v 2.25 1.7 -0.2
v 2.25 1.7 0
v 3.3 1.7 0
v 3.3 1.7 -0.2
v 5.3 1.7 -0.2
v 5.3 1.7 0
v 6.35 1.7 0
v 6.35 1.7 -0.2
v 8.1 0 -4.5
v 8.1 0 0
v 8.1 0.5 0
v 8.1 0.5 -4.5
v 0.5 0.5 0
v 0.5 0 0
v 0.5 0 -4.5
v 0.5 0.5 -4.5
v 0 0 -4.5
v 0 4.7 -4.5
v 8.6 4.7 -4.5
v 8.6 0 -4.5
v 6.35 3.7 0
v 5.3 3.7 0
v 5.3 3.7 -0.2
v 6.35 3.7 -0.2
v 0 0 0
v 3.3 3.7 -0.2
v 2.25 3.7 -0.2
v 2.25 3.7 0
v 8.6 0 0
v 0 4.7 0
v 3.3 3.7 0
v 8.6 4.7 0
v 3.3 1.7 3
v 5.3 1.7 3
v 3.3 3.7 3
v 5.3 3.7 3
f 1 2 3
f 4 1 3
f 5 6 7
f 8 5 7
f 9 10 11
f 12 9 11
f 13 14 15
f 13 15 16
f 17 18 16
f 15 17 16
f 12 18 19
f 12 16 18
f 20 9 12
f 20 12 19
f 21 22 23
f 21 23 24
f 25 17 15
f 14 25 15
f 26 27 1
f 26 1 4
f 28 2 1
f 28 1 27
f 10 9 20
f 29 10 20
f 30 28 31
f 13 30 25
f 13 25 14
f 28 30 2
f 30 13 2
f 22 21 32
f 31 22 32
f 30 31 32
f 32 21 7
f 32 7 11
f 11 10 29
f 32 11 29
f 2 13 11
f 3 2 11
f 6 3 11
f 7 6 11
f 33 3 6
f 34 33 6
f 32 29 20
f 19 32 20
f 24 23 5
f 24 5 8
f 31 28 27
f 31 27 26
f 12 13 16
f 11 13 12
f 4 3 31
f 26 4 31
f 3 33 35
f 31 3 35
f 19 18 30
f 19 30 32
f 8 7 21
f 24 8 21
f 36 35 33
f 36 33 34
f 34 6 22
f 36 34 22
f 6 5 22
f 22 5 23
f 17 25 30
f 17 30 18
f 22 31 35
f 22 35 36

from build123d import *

# Parameters (mm, degrees)
SKETCH_1_W           = 8.6
SKETCH_1_H           = 4.5
EXTRUDE_1_DEPTH      = 4.7
SKETCH_2_W           = 4.1
SKETCH_2_H           = 2
CUT_EXTRUDE_1_DEPTH  = 0.2
CUT_EXTRUDE_2_REACH  = 6.5
SKETCH_4_W           = 7.6
SKETCH_4_H           = 0.5
SKETCH_5_W           = 2
SKETCH_5_H           = 2
EXTRUDE_2_DEPTH      = 3
EXTRUDE_2_DEPTH_BACK = 0.2


with BuildPart() as part:
    # 草图1 → 凸台-拉伸1 (new body)
    with BuildSketch(Plane(origin=(0, 0, 0), x_dir=(1, 0, 0), z_dir=(0, 1, 0))):
        with Locations((4.3, 2.25)):
            Rectangle(SKETCH_1_W, SKETCH_1_H)
    extrude(amount=EXTRUDE_1_DEPTH)

    # 草图2 → 切除-拉伸1 (cut)
    with BuildSketch(Plane.XY):
        with Locations((4.3, 2.7)):
            Rectangle(SKETCH_2_W, SKETCH_2_H)
    extrude(amount=-CUT_EXTRUDE_1_DEPTH, mode=Mode.SUBTRACT)

    # 草图4 → 切除-拉伸2 (cut, up to next)
    with BuildSketch(Plane.XY, mode=Mode.PRIVATE) as cut_extrude_2_sk1:
        with Locations((4.3, 0.25)):
            Rectangle(SKETCH_4_W, SKETCH_4_H)
    cut_extrude_2_tool1 = extrude(cut_extrude_2_sk1.sketch, amount=-CUT_EXTRUDE_2_REACH, mode=Mode.PRIVATE) & part.part
    add(cut_extrude_2_tool1.solids().sort_by_distance((4.3, 0.25, 0))[0], mode=Mode.SUBTRACT)

    # 草图5 → 凸台-拉伸2 (add, two sides)
    with BuildSketch(Plane.XY) as extrude_2_sk:
        with Locations((4.3, 2.7)):
            Rectangle(SKETCH_5_W, SKETCH_5_H)
    extrude(amount=EXTRUDE_2_DEPTH)
    extrude(extrude_2_sk.sketch, amount=-EXTRUDE_2_DEPTH_BACK)


solid = part.part
